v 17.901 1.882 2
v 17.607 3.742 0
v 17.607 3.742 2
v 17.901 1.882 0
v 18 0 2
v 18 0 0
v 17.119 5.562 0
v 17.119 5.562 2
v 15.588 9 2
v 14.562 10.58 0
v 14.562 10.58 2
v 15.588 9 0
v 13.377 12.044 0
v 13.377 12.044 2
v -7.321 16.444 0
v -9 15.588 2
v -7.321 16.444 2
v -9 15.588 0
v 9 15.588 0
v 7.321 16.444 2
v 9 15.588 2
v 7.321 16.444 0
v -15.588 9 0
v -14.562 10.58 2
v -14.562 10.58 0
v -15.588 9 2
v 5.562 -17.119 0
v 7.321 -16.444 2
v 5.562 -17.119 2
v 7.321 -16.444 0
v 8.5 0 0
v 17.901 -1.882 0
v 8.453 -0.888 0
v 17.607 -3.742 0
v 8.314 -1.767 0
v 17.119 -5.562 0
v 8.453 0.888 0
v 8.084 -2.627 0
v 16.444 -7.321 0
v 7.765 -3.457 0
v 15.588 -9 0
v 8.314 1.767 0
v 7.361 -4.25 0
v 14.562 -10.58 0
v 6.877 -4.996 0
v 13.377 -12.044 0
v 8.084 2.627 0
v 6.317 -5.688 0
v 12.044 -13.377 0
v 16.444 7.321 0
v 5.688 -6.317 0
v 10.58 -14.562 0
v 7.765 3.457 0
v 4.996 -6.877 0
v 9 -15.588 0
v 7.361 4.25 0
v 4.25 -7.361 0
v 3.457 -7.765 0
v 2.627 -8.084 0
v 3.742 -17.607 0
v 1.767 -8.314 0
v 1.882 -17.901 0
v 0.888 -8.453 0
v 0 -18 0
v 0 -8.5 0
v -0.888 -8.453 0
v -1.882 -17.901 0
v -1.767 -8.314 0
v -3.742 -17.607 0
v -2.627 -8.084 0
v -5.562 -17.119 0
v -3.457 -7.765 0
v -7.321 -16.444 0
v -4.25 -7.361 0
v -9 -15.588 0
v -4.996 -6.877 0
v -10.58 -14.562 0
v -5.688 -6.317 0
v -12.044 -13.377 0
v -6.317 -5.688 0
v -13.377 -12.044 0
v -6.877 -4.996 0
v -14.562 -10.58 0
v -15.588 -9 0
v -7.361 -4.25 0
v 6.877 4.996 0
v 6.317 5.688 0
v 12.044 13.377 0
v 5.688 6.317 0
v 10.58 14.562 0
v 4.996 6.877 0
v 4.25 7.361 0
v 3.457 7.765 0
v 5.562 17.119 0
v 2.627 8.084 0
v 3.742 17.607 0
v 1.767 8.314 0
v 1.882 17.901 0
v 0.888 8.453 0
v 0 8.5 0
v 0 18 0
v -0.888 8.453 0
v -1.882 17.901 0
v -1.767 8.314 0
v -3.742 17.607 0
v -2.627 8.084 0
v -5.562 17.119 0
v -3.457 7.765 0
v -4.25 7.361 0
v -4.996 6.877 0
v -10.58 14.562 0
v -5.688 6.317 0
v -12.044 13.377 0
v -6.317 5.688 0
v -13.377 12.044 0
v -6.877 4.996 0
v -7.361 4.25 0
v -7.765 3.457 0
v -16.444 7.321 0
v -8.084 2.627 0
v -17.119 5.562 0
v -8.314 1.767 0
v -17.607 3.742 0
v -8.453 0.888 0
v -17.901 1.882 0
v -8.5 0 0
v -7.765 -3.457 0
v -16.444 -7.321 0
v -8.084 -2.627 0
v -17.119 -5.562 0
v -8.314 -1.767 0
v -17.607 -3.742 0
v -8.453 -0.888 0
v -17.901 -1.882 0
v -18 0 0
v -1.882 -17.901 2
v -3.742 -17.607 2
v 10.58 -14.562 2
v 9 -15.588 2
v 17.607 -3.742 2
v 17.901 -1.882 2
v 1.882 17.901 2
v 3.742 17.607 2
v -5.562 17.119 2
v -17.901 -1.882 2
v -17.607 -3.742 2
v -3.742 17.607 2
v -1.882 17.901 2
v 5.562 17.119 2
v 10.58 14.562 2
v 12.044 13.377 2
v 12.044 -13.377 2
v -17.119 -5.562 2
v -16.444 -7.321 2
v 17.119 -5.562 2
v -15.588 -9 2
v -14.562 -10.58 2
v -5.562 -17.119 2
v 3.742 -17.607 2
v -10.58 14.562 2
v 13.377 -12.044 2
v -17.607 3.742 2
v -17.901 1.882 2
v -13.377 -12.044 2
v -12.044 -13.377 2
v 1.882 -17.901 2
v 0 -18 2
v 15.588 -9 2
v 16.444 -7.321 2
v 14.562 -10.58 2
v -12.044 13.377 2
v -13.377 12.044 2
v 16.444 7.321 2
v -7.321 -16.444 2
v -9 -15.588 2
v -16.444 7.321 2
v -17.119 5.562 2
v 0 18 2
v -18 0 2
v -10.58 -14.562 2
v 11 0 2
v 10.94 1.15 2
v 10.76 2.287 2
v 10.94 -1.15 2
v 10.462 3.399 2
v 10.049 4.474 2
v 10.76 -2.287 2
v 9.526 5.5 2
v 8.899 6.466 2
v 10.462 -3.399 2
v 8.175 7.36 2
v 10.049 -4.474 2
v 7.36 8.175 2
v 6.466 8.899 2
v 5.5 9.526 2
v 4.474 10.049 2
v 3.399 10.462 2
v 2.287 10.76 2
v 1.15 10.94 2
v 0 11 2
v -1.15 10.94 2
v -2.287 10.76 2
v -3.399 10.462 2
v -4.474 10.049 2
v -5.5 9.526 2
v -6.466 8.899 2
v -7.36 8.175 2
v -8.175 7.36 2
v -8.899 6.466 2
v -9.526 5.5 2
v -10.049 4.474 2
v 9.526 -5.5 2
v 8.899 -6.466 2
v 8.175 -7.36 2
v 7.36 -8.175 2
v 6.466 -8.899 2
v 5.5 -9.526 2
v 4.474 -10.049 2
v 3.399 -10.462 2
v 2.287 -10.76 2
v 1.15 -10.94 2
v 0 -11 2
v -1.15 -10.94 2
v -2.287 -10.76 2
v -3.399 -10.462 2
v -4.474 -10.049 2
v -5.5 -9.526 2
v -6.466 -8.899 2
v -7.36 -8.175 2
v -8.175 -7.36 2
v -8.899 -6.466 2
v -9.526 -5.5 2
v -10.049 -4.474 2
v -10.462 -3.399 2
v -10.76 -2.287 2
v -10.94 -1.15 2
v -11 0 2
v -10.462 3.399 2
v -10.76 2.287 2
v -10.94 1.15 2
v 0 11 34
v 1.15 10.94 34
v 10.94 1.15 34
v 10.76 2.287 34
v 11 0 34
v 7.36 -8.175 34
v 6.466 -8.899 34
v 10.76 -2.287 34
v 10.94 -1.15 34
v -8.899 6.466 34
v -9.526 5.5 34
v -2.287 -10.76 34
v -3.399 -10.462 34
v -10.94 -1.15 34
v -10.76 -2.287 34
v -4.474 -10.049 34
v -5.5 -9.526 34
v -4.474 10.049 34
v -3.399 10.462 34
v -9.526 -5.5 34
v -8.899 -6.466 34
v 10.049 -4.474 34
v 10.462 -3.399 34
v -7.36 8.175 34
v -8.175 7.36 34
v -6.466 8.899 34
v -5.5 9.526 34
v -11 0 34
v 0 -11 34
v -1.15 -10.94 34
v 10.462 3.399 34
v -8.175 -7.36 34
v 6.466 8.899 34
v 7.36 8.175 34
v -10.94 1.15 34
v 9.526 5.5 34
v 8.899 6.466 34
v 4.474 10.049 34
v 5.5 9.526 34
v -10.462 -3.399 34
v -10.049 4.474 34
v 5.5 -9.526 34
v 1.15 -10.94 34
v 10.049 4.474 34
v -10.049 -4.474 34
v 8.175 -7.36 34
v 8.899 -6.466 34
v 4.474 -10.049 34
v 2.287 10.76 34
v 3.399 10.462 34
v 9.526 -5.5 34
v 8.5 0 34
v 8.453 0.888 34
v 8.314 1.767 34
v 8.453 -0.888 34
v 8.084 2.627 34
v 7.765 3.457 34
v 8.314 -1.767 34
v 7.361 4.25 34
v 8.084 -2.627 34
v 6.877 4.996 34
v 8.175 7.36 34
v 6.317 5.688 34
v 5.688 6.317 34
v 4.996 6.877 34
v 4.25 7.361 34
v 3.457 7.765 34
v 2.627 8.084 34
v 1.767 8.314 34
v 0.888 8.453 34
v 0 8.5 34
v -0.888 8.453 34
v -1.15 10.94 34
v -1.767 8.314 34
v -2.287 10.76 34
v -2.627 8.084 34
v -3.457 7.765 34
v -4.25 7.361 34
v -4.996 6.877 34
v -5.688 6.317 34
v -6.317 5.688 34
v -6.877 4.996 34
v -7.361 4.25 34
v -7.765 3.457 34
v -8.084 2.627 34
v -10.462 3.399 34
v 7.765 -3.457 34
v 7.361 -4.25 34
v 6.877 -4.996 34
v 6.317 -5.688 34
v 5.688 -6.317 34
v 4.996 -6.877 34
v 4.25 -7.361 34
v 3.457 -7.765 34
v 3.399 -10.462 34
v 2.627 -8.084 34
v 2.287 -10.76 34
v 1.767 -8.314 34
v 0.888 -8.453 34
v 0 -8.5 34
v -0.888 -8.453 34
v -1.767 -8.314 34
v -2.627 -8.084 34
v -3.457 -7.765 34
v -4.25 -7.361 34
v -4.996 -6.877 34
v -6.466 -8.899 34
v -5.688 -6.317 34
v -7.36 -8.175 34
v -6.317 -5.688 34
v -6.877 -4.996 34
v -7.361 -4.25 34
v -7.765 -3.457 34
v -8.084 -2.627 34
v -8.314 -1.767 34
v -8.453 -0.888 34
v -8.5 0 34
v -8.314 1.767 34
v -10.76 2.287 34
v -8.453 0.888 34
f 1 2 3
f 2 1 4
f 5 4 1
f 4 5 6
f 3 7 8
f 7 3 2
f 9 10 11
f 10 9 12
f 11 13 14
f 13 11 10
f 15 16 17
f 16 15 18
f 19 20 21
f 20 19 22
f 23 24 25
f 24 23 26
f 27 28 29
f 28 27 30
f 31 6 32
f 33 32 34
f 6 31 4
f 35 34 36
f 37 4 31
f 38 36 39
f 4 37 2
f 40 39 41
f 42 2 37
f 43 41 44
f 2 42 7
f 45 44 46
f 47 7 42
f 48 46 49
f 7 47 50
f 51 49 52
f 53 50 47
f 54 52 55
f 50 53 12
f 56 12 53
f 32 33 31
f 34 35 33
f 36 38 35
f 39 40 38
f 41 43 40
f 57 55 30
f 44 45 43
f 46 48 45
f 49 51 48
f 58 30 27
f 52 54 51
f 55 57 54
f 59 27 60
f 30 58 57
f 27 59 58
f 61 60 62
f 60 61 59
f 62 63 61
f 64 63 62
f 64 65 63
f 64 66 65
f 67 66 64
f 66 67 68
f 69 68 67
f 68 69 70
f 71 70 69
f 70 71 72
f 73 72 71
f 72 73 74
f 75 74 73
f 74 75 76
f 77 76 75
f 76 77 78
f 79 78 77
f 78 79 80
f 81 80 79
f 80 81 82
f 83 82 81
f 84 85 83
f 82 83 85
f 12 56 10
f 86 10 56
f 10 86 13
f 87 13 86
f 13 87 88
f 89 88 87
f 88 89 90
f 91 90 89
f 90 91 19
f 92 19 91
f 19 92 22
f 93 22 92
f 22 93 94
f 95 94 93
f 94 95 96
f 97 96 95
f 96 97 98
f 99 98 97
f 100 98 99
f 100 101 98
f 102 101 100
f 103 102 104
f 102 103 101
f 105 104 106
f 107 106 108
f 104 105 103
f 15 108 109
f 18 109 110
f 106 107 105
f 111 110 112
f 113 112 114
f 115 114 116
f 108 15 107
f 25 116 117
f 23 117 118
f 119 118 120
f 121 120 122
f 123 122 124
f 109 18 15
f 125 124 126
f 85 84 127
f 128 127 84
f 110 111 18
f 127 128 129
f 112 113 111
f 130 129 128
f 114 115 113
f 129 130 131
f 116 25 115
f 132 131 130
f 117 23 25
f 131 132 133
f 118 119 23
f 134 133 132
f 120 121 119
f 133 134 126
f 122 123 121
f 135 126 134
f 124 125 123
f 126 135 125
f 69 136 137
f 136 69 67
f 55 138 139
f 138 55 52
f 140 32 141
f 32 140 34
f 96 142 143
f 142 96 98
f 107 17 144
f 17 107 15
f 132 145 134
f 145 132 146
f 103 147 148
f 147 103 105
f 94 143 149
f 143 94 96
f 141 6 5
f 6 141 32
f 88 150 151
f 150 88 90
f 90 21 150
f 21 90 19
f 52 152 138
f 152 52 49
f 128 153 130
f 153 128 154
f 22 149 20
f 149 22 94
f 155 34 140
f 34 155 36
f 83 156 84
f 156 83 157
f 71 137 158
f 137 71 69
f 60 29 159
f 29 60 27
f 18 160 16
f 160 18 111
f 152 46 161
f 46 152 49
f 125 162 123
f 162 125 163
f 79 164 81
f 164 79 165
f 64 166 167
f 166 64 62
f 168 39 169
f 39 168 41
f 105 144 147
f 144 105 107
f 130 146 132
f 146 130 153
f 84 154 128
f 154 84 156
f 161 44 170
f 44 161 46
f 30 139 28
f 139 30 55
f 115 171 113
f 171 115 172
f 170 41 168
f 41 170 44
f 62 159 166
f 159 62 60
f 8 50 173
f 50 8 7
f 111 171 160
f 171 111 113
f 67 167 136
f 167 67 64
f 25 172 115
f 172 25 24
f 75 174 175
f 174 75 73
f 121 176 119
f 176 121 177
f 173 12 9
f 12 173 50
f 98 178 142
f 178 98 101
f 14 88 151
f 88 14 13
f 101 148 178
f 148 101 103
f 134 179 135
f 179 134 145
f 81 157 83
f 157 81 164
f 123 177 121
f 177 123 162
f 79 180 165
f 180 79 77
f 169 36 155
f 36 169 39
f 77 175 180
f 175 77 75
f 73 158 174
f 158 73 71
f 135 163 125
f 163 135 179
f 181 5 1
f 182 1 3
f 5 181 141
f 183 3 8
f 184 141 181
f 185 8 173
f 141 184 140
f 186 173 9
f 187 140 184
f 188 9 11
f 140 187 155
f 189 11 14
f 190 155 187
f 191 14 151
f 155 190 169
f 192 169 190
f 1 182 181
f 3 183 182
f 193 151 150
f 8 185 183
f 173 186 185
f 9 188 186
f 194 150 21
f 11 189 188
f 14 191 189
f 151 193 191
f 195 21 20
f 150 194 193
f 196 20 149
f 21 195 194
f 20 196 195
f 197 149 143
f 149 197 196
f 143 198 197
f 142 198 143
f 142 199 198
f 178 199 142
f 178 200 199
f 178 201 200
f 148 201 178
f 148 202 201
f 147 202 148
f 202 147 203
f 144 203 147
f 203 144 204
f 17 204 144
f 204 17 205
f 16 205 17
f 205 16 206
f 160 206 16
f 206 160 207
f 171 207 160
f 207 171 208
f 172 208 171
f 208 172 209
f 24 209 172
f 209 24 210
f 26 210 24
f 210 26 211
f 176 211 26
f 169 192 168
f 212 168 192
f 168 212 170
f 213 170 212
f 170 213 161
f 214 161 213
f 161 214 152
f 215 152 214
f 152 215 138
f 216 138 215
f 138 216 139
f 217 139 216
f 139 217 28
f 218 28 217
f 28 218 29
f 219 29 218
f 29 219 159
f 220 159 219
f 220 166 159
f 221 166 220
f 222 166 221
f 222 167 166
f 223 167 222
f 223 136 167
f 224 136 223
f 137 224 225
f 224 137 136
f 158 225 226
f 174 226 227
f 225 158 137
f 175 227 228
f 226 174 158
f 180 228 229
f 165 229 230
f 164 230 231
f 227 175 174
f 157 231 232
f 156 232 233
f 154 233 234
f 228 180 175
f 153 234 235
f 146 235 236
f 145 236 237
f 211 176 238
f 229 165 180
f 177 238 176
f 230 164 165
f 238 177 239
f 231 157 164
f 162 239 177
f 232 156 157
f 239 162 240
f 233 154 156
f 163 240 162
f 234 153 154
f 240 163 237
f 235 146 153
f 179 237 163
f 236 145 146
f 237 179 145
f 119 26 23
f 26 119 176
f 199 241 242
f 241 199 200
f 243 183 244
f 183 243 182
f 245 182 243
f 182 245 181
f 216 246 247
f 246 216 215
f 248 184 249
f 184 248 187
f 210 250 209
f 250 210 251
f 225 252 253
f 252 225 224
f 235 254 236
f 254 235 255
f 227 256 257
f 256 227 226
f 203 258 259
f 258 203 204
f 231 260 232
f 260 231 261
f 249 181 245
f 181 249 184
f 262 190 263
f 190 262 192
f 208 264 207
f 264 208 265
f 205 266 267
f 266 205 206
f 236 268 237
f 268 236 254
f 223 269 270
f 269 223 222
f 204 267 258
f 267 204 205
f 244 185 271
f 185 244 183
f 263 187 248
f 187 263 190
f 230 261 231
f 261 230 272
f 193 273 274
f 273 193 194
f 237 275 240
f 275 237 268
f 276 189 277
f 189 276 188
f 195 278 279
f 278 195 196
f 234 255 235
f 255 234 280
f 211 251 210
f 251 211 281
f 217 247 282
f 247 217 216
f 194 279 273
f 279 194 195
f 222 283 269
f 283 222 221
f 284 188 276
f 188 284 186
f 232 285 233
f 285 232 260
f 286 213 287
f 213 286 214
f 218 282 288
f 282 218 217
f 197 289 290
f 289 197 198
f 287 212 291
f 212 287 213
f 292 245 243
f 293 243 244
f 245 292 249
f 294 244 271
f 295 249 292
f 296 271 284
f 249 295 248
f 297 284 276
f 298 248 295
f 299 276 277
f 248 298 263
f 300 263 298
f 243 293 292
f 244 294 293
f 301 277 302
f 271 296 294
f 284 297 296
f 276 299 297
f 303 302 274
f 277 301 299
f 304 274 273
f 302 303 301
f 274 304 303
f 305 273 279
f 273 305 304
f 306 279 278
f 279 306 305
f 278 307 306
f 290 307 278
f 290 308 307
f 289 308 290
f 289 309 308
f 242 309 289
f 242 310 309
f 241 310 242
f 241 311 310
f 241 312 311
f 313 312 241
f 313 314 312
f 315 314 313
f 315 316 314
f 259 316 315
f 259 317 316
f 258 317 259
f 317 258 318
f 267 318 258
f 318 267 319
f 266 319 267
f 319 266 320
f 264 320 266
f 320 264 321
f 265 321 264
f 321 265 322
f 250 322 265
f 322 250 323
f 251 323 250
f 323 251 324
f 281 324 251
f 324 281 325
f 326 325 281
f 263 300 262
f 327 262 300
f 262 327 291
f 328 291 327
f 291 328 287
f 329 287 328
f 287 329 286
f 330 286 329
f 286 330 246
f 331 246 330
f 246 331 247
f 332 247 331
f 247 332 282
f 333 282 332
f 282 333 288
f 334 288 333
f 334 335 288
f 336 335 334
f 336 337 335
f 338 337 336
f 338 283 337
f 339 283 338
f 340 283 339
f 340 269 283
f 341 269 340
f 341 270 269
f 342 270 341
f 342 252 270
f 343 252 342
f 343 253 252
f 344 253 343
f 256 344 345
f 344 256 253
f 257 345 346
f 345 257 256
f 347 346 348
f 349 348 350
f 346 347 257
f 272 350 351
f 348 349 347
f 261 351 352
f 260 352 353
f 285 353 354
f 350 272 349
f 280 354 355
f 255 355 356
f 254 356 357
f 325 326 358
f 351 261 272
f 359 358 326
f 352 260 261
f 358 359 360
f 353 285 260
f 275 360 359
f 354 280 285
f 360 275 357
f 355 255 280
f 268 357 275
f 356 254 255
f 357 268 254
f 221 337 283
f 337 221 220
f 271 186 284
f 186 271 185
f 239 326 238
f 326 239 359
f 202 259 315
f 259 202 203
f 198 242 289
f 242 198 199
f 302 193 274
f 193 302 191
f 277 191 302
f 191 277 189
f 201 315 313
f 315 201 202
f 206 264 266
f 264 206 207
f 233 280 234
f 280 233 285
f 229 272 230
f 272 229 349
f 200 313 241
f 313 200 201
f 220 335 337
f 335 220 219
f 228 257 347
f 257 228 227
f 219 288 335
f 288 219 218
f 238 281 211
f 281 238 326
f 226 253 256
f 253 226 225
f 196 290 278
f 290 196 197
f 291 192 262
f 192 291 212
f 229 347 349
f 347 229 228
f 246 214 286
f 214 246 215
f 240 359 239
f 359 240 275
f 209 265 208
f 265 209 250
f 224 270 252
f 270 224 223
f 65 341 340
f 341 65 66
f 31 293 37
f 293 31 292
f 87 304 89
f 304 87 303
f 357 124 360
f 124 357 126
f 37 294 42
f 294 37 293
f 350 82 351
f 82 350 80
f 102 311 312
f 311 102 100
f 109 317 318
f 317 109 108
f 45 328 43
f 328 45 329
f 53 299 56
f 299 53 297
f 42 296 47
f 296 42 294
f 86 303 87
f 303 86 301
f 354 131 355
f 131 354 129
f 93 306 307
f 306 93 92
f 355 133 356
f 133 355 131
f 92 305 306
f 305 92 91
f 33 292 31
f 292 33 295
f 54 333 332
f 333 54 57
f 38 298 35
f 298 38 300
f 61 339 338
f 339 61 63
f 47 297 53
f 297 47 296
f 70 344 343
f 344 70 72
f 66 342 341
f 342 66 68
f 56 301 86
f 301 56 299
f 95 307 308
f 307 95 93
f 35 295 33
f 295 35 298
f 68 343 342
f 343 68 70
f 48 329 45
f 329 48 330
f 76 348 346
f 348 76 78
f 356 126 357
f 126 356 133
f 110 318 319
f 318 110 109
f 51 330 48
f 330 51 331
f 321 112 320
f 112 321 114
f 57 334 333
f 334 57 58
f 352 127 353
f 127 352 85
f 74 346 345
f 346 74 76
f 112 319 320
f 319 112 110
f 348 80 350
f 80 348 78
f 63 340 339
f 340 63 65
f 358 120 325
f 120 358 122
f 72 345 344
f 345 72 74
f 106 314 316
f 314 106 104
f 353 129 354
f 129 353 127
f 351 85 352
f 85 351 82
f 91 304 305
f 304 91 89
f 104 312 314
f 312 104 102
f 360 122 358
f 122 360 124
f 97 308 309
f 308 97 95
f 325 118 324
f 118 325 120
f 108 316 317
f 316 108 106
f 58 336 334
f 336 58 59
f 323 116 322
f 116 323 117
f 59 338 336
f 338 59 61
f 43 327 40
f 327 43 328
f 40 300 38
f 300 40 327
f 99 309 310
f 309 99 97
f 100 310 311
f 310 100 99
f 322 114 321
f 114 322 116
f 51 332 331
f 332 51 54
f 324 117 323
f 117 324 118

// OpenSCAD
// Wall-mount standoff with screw flange.
$fn = 60;
eps = 0.02;
thread_d = 17;
base_d = 36;
length = 34;
difference() { union() { cylinder(d=base_d,h=2); cylinder(d=thread_d+5,h=length); } translate([0,0,-eps]) cylinder(d=thread_d,h=length+2*eps); }
